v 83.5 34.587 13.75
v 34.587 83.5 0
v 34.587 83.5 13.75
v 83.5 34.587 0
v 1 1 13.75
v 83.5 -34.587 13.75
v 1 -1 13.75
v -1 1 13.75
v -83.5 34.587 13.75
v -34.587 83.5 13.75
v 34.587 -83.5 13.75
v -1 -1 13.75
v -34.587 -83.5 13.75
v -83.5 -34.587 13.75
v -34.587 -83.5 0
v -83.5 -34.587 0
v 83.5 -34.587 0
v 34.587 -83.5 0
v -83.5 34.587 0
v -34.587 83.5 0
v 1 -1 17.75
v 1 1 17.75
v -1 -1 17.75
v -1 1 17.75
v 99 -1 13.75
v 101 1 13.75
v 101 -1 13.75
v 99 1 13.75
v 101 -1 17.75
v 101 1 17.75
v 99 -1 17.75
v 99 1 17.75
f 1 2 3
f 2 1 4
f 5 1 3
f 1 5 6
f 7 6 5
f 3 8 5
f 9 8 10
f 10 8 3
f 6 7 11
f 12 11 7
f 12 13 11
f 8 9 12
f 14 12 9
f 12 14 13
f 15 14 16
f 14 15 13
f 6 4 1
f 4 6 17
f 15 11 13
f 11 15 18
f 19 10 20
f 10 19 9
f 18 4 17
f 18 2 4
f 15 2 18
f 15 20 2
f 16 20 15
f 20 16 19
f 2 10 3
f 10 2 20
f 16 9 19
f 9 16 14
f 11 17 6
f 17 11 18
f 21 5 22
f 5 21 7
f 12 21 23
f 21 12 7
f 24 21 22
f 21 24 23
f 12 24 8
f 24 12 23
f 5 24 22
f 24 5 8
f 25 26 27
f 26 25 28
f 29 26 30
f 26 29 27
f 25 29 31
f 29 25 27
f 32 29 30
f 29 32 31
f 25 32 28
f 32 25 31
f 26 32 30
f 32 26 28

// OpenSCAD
// Generated by DescriptiveCAD bootstrap v0.2
  // boundary visualization
  linear_extrude(height=13.75) polygon(points=[[-34.586832, 83.500000], [34.586832, 83.500000], [83.500000, 34.586832], [83.500000, -34.586832], [34.586832, -83.500000], [-34.586832, -83.500000], [-83.500000, -34.586832], [-83.500000, 34.586832]]);
  translate([0,0,13.75]) linear_extrude(height=4) polygon(points=[[-1.000000, -1.000000], [1.000000, -1.000000], [1.000000, 1.000000], [-1.000000, 1.000000]]);
  translate([0,0,13.75]) linear_extrude(height=4) polygon(points=[[99.000000, -1.000000], [101.000000, -1.000000], [101.000000, 1.000000], [99.000000, 1.000000]]);
  translate([0,0,0.0]) linear_extrude(height=1.5) polygon(points=[[23.250000, 0.000000], [26.750000, 0.000000], [26.750000, 10.000000], [23.250000, 10.000000]]);
  translate([0,0,0.0]) linear_extrude(height=1.5) polygon(points=[[48.250000, 0.000000], [51.750000, 0.000000], [51.750000, 10.000000], [48.250000, 10.000000]]);
  translate([0,0,0.0]) linear_extrude(height=1.5) polygon(points=[[73.250000, 0.000000], [76.750000, 0.000000], [76.750000, 10.000000], [73.250000, 10.000000]]);
